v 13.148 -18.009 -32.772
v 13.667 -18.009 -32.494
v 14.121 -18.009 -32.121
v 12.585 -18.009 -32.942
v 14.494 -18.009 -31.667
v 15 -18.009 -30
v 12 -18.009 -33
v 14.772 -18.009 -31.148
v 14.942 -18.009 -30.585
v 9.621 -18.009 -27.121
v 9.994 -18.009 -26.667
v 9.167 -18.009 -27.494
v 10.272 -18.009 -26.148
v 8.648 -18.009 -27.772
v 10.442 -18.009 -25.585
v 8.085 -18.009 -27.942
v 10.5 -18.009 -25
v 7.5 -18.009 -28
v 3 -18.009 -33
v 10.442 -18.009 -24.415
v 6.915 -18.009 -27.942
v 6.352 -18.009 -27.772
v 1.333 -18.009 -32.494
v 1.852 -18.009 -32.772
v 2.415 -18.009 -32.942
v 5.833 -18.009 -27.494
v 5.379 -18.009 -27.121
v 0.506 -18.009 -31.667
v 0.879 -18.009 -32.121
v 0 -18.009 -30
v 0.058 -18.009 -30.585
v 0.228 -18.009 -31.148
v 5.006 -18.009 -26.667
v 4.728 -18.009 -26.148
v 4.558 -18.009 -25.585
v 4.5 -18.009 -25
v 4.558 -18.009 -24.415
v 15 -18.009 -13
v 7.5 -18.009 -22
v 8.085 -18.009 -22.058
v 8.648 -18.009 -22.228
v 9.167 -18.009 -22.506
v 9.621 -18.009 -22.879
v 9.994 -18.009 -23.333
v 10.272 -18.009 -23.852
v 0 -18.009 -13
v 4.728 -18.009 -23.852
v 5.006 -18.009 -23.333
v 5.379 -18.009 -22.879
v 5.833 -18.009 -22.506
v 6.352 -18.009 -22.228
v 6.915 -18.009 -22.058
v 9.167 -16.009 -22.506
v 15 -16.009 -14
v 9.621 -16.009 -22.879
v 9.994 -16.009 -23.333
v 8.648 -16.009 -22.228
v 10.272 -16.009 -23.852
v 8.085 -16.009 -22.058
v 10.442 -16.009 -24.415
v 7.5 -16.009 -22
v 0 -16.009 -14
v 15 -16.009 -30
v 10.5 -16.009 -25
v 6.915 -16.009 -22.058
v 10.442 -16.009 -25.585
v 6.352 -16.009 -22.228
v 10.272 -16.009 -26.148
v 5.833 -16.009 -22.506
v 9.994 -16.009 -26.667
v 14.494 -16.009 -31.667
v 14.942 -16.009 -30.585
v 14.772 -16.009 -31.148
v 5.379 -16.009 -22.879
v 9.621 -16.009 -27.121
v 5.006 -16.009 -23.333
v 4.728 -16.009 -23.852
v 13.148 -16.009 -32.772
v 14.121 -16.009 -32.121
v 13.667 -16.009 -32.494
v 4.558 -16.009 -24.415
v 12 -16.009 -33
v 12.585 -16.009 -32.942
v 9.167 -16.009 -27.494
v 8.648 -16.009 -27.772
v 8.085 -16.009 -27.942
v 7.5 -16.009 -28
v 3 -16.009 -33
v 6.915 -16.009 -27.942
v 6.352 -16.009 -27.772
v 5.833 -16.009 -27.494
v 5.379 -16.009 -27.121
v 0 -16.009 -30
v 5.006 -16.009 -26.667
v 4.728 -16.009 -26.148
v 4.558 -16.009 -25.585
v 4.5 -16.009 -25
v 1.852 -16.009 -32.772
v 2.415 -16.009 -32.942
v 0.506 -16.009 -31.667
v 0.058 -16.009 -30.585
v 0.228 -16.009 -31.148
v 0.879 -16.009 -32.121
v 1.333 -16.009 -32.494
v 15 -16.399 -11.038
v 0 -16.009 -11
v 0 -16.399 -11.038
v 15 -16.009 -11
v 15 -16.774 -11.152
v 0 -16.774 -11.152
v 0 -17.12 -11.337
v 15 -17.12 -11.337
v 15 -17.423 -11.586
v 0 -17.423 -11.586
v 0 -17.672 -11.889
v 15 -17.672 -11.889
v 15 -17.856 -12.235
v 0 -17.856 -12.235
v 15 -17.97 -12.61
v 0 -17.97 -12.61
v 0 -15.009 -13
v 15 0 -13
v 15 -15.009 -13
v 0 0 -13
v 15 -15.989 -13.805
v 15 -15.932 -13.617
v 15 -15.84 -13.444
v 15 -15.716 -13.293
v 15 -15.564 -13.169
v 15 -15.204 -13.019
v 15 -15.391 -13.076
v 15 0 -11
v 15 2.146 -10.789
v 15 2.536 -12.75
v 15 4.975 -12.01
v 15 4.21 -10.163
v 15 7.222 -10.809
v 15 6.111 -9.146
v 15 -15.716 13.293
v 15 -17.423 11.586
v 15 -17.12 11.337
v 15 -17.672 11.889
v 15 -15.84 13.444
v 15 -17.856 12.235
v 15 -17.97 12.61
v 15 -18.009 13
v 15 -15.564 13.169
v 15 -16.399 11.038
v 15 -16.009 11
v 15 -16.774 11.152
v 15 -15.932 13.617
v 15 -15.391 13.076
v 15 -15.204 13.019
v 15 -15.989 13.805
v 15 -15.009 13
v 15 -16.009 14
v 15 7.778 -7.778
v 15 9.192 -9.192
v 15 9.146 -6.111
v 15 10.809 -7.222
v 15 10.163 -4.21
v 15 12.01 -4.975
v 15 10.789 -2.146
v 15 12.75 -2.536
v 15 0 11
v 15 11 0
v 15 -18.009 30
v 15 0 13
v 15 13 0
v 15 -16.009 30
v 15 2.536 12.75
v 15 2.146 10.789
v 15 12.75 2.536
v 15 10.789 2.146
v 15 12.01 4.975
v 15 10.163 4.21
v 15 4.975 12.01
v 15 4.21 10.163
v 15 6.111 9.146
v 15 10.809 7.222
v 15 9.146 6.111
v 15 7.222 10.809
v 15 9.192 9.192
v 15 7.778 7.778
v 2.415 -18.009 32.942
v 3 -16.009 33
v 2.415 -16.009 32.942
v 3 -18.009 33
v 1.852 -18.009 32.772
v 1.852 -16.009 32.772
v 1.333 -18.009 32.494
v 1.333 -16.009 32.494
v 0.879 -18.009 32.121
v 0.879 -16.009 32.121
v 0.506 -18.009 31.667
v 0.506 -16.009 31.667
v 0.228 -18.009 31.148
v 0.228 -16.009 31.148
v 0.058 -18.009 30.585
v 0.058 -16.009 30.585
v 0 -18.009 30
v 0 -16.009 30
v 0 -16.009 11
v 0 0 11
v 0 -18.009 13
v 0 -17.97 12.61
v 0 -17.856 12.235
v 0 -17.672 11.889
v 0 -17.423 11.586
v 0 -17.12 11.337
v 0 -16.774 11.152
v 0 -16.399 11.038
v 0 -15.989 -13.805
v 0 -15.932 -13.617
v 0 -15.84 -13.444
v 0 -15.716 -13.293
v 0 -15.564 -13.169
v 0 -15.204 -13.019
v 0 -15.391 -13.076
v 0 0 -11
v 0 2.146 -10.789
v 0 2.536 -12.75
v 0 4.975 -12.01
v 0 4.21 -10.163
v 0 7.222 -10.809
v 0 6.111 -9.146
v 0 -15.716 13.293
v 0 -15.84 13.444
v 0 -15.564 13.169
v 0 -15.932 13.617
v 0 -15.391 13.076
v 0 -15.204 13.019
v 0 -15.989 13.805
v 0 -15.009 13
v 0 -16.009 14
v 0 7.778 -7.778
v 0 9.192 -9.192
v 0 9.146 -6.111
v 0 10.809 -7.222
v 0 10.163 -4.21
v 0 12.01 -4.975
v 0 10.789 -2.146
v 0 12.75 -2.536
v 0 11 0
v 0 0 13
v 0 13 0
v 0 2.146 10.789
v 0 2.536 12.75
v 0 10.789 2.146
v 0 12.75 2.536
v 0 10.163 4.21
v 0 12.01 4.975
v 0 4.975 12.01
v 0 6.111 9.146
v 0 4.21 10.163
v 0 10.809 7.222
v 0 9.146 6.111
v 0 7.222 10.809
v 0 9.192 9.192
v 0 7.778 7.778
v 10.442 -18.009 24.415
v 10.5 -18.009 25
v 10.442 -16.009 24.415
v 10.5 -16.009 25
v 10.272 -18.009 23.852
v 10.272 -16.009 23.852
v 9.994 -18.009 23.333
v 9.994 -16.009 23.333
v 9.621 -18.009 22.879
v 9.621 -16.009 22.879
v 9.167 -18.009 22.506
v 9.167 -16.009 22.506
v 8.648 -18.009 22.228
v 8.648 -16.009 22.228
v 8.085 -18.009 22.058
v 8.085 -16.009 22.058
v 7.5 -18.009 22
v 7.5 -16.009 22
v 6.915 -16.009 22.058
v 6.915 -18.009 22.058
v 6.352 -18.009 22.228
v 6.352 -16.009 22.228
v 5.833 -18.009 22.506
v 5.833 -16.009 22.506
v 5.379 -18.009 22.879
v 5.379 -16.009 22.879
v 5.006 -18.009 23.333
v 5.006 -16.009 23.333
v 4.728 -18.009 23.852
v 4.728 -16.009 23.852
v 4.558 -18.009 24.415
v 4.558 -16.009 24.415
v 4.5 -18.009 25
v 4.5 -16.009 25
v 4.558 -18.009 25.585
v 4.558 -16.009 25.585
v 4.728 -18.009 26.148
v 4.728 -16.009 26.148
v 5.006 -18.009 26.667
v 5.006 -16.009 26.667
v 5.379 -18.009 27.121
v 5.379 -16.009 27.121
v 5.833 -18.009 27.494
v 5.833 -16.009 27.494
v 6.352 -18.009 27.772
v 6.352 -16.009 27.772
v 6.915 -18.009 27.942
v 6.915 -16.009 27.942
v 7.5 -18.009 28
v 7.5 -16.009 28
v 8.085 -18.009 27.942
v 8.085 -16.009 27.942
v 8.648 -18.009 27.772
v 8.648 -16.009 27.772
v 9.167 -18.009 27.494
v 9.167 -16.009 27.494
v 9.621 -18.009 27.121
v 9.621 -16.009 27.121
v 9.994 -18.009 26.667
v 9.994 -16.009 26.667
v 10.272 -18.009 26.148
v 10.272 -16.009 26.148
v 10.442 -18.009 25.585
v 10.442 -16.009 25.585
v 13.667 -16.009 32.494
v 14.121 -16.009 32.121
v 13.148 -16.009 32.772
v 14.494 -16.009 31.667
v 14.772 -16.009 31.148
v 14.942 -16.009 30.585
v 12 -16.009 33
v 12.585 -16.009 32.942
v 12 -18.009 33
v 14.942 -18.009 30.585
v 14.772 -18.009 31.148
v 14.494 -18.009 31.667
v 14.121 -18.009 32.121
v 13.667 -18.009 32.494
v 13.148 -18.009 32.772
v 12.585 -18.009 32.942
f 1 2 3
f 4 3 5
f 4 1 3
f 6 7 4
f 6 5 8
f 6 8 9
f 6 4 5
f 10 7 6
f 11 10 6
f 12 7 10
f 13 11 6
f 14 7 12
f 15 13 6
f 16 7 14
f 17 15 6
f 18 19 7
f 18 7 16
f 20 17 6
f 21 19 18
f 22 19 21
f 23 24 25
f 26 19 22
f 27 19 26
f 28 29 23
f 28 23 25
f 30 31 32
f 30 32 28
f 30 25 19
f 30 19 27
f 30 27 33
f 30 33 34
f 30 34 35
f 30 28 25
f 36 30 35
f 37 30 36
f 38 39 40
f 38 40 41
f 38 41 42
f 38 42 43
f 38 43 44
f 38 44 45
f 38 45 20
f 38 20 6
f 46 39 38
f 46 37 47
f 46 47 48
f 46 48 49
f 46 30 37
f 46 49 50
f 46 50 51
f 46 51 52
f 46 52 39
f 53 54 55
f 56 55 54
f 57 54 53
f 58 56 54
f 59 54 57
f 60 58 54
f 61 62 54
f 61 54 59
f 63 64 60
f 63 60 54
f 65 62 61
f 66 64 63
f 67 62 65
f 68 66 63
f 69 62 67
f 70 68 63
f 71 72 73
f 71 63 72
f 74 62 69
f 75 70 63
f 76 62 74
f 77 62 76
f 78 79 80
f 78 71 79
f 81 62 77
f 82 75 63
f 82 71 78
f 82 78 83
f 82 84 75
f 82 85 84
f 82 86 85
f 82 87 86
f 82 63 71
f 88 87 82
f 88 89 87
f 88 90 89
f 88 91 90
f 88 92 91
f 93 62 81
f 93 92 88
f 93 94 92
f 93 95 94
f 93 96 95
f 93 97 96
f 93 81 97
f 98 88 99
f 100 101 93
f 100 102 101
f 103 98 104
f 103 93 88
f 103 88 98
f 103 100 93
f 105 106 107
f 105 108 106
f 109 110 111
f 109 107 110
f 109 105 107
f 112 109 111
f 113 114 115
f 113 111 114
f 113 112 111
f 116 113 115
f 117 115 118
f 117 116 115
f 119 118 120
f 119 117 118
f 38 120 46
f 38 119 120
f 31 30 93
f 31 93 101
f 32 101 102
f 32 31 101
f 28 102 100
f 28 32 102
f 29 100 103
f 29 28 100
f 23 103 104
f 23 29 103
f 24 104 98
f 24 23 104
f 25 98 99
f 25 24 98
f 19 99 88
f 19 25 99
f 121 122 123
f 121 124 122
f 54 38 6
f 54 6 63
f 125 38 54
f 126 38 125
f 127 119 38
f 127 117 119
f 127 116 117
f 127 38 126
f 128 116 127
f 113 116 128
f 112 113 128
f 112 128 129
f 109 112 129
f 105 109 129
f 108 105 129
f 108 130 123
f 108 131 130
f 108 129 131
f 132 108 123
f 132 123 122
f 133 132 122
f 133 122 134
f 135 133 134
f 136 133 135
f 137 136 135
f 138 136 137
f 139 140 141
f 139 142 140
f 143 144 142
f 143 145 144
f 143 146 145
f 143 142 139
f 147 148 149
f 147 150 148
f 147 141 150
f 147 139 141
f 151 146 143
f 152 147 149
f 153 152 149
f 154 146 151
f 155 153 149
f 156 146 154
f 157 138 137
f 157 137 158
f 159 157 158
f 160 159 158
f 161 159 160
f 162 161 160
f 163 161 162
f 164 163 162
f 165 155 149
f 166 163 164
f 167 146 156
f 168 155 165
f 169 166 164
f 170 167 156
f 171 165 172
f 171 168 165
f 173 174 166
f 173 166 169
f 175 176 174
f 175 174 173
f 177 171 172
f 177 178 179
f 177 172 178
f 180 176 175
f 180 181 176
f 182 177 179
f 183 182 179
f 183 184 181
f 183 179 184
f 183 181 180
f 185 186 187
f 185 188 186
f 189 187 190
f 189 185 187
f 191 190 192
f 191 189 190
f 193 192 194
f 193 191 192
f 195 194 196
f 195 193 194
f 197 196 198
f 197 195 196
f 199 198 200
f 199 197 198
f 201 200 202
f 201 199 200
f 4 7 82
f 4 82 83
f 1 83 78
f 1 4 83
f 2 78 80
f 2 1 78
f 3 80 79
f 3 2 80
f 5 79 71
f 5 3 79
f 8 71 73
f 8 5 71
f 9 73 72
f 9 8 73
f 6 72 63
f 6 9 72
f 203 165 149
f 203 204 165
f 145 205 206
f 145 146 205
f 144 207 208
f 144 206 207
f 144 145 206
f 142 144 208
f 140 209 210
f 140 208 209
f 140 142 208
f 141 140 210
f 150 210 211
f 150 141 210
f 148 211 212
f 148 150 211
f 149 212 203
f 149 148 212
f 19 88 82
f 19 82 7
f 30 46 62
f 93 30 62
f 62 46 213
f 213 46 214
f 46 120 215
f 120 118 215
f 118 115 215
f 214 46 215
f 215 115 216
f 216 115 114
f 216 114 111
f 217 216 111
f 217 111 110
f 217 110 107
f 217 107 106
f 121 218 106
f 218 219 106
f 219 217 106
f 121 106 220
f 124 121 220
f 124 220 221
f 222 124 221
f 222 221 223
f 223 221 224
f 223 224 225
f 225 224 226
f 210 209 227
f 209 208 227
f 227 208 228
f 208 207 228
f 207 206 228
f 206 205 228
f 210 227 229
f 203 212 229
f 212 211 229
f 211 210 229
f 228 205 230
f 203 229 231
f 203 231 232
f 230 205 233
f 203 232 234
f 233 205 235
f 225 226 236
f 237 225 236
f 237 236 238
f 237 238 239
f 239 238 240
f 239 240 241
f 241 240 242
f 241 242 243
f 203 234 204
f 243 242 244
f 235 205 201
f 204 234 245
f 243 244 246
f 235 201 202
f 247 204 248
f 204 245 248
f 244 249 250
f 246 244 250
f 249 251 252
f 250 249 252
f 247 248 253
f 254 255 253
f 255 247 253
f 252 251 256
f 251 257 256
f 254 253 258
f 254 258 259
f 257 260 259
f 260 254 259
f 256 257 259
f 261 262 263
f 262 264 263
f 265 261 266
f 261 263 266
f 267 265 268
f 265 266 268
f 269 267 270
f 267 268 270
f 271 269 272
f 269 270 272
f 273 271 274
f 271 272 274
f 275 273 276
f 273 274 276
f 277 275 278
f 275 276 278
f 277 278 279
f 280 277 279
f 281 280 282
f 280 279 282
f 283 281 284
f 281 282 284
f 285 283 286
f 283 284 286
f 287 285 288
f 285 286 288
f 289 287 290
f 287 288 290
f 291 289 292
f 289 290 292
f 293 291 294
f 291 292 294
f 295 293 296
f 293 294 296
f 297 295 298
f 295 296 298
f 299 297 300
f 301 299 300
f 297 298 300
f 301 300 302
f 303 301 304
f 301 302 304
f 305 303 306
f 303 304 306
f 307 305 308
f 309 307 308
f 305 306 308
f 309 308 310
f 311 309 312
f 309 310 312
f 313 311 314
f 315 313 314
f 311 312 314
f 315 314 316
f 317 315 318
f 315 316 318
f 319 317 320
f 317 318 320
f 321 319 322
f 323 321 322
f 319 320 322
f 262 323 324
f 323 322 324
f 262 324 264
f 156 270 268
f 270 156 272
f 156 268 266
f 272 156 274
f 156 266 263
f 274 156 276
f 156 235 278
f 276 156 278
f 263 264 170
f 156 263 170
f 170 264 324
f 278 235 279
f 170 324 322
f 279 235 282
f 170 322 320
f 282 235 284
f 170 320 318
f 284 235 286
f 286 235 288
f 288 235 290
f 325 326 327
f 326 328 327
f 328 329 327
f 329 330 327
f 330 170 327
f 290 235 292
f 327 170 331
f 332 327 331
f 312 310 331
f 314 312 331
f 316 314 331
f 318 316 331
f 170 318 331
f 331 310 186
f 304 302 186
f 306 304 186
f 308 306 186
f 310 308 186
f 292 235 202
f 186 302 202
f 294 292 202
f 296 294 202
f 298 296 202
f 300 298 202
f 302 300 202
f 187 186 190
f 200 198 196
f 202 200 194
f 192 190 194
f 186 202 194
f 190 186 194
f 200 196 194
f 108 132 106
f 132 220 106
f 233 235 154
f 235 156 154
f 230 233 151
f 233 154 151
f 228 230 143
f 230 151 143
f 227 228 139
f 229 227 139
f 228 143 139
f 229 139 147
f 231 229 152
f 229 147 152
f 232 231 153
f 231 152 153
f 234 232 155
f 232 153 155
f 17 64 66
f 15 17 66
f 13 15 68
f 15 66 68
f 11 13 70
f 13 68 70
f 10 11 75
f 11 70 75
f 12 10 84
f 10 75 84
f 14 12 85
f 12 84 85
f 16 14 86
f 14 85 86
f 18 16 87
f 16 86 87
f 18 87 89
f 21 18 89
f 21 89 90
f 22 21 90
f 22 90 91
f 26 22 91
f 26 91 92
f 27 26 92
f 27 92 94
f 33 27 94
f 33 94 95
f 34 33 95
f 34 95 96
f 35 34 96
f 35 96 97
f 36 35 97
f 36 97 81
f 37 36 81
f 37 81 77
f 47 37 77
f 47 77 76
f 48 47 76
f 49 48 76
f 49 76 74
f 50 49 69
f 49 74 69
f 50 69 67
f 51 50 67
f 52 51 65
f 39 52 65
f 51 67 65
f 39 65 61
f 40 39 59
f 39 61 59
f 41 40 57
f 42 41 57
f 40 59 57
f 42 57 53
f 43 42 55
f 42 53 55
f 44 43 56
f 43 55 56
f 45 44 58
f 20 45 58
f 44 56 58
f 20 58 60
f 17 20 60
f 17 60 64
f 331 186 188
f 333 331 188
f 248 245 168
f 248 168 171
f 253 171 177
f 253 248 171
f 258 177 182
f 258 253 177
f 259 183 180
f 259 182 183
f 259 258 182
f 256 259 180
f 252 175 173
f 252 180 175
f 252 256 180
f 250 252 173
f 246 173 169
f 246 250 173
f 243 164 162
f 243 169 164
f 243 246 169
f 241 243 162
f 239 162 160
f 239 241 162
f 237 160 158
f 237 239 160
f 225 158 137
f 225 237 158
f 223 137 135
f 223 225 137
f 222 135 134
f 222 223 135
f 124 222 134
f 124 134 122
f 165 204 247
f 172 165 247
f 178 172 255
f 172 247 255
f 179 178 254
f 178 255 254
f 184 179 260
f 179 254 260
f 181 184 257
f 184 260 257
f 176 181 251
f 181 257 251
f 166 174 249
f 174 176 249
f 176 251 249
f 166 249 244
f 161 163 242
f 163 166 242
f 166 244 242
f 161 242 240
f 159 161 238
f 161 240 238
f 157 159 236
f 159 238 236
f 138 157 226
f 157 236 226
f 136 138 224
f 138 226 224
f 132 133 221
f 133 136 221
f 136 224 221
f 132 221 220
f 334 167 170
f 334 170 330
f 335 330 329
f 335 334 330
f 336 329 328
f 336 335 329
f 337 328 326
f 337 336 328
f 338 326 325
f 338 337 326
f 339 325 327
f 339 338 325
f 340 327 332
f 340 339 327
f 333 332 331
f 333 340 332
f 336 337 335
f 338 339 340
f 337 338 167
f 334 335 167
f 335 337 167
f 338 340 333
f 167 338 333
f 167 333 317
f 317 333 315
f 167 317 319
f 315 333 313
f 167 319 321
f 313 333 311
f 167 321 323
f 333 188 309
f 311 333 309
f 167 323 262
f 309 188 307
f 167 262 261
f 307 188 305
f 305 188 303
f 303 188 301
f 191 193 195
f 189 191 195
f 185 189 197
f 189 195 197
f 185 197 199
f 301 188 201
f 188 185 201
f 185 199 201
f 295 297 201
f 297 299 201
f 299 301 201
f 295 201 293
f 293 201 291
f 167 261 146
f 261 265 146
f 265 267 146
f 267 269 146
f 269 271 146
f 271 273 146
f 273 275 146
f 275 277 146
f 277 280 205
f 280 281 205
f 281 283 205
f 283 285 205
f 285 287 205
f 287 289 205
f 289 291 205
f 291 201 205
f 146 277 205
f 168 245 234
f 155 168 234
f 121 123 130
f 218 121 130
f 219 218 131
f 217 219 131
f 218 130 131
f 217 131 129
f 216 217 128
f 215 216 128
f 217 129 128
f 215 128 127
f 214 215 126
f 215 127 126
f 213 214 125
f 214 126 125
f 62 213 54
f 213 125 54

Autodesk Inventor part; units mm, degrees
ref_plane "YZ Plane" through (0, 0, 0) normal (1, 0, 0) x (0, 1, 0)
ref_plane "XZ Plane" through (0, 0, 0) normal (0, 1, 0) x (-1, 0, 0)
ref_plane "XY Plane" through (0, 0, 0) normal (0, 0, 1) x (1, 0, 0)
sketch "Sketch1" plane through (0, 0, 0) normal (1, 0, 0) x (0, 1, 0)
  arc A0 (0, -11) -> (0, 11) centre (0, 0) ccw
  arc A1 (0, -13) -> (0, 13) centre (0, 0) ccw
  line L0 (0, 13) -> (-16.0086, 13)
  line L1 (0, 11) -> (-18.0086, 11)
  line L2 (0, 0) -> (4.4908, 0)
  line L3 (-18.0086, 11) -> (-11, 11)
  line L4 (-16.0086, 13) -> (-16.0086, 33)
  line L5 (-16.0086, 33) -> (-18.0086, 33)
  line L6 (-18.0086, 33) -> (-18.0086, 11)
  line L7 (0, -13) -> (-16.0086, -13)
  line L8 (0, -11) -> (-18.0086, -11)
  line L9 (-18.0086, -11) -> (-11, -11)
  line L10 (-16.0086, -13) -> (-16.0086, -33)
  line L11 (-16.0086, -33) -> (-18.0086, -33)
  line L12 (-18.0086, -33) -> (-18.0086, -11)
  point P0 (-6.9282, 11)
  point P1 (-6.9282, -11)
  dimension "d0" = 22
  dimension "d1" = 2
  dimension "d12" = 18.0086
  dimension "d13" = 2
  dimension "d14" = 22
extrude "Extrusion1" add sketch "Sketch1" along normal blind 15
fillet "Fillet1" radius 2 2 edges at (7.5, -18.0086, -11) (7.5, -18.0086, 11)
fillet "Fillet2" radius 1 2 edges at (7.5, -16.0086, 13) (7.5, -16.0086, -13)
fillet "Fillet3" radius 3 4 edges at (15, -17.0086, 33) (0, -17.0086, 33) (15, -17.0086, -33) (0, -17.0086, -33)
sketch "Sketch2" plane through (0, -16.0086, 14) normal (0, 1, 0) x (1, 0, 0)
  circle A0 centre (7.5, -11) radius 3
  line L0 (3, -19) -> (12, -19) projected
  line L1 (0, 14) -> (27.6341, 14)
  circle A1 centre (7.5, 39) radius 3
  dimension "d8" = 6
  dimension "d9" = 8
extrude "Extrusion2" cut sketch "Sketch2" against normal blind 15
properties part number "rackbracket"
